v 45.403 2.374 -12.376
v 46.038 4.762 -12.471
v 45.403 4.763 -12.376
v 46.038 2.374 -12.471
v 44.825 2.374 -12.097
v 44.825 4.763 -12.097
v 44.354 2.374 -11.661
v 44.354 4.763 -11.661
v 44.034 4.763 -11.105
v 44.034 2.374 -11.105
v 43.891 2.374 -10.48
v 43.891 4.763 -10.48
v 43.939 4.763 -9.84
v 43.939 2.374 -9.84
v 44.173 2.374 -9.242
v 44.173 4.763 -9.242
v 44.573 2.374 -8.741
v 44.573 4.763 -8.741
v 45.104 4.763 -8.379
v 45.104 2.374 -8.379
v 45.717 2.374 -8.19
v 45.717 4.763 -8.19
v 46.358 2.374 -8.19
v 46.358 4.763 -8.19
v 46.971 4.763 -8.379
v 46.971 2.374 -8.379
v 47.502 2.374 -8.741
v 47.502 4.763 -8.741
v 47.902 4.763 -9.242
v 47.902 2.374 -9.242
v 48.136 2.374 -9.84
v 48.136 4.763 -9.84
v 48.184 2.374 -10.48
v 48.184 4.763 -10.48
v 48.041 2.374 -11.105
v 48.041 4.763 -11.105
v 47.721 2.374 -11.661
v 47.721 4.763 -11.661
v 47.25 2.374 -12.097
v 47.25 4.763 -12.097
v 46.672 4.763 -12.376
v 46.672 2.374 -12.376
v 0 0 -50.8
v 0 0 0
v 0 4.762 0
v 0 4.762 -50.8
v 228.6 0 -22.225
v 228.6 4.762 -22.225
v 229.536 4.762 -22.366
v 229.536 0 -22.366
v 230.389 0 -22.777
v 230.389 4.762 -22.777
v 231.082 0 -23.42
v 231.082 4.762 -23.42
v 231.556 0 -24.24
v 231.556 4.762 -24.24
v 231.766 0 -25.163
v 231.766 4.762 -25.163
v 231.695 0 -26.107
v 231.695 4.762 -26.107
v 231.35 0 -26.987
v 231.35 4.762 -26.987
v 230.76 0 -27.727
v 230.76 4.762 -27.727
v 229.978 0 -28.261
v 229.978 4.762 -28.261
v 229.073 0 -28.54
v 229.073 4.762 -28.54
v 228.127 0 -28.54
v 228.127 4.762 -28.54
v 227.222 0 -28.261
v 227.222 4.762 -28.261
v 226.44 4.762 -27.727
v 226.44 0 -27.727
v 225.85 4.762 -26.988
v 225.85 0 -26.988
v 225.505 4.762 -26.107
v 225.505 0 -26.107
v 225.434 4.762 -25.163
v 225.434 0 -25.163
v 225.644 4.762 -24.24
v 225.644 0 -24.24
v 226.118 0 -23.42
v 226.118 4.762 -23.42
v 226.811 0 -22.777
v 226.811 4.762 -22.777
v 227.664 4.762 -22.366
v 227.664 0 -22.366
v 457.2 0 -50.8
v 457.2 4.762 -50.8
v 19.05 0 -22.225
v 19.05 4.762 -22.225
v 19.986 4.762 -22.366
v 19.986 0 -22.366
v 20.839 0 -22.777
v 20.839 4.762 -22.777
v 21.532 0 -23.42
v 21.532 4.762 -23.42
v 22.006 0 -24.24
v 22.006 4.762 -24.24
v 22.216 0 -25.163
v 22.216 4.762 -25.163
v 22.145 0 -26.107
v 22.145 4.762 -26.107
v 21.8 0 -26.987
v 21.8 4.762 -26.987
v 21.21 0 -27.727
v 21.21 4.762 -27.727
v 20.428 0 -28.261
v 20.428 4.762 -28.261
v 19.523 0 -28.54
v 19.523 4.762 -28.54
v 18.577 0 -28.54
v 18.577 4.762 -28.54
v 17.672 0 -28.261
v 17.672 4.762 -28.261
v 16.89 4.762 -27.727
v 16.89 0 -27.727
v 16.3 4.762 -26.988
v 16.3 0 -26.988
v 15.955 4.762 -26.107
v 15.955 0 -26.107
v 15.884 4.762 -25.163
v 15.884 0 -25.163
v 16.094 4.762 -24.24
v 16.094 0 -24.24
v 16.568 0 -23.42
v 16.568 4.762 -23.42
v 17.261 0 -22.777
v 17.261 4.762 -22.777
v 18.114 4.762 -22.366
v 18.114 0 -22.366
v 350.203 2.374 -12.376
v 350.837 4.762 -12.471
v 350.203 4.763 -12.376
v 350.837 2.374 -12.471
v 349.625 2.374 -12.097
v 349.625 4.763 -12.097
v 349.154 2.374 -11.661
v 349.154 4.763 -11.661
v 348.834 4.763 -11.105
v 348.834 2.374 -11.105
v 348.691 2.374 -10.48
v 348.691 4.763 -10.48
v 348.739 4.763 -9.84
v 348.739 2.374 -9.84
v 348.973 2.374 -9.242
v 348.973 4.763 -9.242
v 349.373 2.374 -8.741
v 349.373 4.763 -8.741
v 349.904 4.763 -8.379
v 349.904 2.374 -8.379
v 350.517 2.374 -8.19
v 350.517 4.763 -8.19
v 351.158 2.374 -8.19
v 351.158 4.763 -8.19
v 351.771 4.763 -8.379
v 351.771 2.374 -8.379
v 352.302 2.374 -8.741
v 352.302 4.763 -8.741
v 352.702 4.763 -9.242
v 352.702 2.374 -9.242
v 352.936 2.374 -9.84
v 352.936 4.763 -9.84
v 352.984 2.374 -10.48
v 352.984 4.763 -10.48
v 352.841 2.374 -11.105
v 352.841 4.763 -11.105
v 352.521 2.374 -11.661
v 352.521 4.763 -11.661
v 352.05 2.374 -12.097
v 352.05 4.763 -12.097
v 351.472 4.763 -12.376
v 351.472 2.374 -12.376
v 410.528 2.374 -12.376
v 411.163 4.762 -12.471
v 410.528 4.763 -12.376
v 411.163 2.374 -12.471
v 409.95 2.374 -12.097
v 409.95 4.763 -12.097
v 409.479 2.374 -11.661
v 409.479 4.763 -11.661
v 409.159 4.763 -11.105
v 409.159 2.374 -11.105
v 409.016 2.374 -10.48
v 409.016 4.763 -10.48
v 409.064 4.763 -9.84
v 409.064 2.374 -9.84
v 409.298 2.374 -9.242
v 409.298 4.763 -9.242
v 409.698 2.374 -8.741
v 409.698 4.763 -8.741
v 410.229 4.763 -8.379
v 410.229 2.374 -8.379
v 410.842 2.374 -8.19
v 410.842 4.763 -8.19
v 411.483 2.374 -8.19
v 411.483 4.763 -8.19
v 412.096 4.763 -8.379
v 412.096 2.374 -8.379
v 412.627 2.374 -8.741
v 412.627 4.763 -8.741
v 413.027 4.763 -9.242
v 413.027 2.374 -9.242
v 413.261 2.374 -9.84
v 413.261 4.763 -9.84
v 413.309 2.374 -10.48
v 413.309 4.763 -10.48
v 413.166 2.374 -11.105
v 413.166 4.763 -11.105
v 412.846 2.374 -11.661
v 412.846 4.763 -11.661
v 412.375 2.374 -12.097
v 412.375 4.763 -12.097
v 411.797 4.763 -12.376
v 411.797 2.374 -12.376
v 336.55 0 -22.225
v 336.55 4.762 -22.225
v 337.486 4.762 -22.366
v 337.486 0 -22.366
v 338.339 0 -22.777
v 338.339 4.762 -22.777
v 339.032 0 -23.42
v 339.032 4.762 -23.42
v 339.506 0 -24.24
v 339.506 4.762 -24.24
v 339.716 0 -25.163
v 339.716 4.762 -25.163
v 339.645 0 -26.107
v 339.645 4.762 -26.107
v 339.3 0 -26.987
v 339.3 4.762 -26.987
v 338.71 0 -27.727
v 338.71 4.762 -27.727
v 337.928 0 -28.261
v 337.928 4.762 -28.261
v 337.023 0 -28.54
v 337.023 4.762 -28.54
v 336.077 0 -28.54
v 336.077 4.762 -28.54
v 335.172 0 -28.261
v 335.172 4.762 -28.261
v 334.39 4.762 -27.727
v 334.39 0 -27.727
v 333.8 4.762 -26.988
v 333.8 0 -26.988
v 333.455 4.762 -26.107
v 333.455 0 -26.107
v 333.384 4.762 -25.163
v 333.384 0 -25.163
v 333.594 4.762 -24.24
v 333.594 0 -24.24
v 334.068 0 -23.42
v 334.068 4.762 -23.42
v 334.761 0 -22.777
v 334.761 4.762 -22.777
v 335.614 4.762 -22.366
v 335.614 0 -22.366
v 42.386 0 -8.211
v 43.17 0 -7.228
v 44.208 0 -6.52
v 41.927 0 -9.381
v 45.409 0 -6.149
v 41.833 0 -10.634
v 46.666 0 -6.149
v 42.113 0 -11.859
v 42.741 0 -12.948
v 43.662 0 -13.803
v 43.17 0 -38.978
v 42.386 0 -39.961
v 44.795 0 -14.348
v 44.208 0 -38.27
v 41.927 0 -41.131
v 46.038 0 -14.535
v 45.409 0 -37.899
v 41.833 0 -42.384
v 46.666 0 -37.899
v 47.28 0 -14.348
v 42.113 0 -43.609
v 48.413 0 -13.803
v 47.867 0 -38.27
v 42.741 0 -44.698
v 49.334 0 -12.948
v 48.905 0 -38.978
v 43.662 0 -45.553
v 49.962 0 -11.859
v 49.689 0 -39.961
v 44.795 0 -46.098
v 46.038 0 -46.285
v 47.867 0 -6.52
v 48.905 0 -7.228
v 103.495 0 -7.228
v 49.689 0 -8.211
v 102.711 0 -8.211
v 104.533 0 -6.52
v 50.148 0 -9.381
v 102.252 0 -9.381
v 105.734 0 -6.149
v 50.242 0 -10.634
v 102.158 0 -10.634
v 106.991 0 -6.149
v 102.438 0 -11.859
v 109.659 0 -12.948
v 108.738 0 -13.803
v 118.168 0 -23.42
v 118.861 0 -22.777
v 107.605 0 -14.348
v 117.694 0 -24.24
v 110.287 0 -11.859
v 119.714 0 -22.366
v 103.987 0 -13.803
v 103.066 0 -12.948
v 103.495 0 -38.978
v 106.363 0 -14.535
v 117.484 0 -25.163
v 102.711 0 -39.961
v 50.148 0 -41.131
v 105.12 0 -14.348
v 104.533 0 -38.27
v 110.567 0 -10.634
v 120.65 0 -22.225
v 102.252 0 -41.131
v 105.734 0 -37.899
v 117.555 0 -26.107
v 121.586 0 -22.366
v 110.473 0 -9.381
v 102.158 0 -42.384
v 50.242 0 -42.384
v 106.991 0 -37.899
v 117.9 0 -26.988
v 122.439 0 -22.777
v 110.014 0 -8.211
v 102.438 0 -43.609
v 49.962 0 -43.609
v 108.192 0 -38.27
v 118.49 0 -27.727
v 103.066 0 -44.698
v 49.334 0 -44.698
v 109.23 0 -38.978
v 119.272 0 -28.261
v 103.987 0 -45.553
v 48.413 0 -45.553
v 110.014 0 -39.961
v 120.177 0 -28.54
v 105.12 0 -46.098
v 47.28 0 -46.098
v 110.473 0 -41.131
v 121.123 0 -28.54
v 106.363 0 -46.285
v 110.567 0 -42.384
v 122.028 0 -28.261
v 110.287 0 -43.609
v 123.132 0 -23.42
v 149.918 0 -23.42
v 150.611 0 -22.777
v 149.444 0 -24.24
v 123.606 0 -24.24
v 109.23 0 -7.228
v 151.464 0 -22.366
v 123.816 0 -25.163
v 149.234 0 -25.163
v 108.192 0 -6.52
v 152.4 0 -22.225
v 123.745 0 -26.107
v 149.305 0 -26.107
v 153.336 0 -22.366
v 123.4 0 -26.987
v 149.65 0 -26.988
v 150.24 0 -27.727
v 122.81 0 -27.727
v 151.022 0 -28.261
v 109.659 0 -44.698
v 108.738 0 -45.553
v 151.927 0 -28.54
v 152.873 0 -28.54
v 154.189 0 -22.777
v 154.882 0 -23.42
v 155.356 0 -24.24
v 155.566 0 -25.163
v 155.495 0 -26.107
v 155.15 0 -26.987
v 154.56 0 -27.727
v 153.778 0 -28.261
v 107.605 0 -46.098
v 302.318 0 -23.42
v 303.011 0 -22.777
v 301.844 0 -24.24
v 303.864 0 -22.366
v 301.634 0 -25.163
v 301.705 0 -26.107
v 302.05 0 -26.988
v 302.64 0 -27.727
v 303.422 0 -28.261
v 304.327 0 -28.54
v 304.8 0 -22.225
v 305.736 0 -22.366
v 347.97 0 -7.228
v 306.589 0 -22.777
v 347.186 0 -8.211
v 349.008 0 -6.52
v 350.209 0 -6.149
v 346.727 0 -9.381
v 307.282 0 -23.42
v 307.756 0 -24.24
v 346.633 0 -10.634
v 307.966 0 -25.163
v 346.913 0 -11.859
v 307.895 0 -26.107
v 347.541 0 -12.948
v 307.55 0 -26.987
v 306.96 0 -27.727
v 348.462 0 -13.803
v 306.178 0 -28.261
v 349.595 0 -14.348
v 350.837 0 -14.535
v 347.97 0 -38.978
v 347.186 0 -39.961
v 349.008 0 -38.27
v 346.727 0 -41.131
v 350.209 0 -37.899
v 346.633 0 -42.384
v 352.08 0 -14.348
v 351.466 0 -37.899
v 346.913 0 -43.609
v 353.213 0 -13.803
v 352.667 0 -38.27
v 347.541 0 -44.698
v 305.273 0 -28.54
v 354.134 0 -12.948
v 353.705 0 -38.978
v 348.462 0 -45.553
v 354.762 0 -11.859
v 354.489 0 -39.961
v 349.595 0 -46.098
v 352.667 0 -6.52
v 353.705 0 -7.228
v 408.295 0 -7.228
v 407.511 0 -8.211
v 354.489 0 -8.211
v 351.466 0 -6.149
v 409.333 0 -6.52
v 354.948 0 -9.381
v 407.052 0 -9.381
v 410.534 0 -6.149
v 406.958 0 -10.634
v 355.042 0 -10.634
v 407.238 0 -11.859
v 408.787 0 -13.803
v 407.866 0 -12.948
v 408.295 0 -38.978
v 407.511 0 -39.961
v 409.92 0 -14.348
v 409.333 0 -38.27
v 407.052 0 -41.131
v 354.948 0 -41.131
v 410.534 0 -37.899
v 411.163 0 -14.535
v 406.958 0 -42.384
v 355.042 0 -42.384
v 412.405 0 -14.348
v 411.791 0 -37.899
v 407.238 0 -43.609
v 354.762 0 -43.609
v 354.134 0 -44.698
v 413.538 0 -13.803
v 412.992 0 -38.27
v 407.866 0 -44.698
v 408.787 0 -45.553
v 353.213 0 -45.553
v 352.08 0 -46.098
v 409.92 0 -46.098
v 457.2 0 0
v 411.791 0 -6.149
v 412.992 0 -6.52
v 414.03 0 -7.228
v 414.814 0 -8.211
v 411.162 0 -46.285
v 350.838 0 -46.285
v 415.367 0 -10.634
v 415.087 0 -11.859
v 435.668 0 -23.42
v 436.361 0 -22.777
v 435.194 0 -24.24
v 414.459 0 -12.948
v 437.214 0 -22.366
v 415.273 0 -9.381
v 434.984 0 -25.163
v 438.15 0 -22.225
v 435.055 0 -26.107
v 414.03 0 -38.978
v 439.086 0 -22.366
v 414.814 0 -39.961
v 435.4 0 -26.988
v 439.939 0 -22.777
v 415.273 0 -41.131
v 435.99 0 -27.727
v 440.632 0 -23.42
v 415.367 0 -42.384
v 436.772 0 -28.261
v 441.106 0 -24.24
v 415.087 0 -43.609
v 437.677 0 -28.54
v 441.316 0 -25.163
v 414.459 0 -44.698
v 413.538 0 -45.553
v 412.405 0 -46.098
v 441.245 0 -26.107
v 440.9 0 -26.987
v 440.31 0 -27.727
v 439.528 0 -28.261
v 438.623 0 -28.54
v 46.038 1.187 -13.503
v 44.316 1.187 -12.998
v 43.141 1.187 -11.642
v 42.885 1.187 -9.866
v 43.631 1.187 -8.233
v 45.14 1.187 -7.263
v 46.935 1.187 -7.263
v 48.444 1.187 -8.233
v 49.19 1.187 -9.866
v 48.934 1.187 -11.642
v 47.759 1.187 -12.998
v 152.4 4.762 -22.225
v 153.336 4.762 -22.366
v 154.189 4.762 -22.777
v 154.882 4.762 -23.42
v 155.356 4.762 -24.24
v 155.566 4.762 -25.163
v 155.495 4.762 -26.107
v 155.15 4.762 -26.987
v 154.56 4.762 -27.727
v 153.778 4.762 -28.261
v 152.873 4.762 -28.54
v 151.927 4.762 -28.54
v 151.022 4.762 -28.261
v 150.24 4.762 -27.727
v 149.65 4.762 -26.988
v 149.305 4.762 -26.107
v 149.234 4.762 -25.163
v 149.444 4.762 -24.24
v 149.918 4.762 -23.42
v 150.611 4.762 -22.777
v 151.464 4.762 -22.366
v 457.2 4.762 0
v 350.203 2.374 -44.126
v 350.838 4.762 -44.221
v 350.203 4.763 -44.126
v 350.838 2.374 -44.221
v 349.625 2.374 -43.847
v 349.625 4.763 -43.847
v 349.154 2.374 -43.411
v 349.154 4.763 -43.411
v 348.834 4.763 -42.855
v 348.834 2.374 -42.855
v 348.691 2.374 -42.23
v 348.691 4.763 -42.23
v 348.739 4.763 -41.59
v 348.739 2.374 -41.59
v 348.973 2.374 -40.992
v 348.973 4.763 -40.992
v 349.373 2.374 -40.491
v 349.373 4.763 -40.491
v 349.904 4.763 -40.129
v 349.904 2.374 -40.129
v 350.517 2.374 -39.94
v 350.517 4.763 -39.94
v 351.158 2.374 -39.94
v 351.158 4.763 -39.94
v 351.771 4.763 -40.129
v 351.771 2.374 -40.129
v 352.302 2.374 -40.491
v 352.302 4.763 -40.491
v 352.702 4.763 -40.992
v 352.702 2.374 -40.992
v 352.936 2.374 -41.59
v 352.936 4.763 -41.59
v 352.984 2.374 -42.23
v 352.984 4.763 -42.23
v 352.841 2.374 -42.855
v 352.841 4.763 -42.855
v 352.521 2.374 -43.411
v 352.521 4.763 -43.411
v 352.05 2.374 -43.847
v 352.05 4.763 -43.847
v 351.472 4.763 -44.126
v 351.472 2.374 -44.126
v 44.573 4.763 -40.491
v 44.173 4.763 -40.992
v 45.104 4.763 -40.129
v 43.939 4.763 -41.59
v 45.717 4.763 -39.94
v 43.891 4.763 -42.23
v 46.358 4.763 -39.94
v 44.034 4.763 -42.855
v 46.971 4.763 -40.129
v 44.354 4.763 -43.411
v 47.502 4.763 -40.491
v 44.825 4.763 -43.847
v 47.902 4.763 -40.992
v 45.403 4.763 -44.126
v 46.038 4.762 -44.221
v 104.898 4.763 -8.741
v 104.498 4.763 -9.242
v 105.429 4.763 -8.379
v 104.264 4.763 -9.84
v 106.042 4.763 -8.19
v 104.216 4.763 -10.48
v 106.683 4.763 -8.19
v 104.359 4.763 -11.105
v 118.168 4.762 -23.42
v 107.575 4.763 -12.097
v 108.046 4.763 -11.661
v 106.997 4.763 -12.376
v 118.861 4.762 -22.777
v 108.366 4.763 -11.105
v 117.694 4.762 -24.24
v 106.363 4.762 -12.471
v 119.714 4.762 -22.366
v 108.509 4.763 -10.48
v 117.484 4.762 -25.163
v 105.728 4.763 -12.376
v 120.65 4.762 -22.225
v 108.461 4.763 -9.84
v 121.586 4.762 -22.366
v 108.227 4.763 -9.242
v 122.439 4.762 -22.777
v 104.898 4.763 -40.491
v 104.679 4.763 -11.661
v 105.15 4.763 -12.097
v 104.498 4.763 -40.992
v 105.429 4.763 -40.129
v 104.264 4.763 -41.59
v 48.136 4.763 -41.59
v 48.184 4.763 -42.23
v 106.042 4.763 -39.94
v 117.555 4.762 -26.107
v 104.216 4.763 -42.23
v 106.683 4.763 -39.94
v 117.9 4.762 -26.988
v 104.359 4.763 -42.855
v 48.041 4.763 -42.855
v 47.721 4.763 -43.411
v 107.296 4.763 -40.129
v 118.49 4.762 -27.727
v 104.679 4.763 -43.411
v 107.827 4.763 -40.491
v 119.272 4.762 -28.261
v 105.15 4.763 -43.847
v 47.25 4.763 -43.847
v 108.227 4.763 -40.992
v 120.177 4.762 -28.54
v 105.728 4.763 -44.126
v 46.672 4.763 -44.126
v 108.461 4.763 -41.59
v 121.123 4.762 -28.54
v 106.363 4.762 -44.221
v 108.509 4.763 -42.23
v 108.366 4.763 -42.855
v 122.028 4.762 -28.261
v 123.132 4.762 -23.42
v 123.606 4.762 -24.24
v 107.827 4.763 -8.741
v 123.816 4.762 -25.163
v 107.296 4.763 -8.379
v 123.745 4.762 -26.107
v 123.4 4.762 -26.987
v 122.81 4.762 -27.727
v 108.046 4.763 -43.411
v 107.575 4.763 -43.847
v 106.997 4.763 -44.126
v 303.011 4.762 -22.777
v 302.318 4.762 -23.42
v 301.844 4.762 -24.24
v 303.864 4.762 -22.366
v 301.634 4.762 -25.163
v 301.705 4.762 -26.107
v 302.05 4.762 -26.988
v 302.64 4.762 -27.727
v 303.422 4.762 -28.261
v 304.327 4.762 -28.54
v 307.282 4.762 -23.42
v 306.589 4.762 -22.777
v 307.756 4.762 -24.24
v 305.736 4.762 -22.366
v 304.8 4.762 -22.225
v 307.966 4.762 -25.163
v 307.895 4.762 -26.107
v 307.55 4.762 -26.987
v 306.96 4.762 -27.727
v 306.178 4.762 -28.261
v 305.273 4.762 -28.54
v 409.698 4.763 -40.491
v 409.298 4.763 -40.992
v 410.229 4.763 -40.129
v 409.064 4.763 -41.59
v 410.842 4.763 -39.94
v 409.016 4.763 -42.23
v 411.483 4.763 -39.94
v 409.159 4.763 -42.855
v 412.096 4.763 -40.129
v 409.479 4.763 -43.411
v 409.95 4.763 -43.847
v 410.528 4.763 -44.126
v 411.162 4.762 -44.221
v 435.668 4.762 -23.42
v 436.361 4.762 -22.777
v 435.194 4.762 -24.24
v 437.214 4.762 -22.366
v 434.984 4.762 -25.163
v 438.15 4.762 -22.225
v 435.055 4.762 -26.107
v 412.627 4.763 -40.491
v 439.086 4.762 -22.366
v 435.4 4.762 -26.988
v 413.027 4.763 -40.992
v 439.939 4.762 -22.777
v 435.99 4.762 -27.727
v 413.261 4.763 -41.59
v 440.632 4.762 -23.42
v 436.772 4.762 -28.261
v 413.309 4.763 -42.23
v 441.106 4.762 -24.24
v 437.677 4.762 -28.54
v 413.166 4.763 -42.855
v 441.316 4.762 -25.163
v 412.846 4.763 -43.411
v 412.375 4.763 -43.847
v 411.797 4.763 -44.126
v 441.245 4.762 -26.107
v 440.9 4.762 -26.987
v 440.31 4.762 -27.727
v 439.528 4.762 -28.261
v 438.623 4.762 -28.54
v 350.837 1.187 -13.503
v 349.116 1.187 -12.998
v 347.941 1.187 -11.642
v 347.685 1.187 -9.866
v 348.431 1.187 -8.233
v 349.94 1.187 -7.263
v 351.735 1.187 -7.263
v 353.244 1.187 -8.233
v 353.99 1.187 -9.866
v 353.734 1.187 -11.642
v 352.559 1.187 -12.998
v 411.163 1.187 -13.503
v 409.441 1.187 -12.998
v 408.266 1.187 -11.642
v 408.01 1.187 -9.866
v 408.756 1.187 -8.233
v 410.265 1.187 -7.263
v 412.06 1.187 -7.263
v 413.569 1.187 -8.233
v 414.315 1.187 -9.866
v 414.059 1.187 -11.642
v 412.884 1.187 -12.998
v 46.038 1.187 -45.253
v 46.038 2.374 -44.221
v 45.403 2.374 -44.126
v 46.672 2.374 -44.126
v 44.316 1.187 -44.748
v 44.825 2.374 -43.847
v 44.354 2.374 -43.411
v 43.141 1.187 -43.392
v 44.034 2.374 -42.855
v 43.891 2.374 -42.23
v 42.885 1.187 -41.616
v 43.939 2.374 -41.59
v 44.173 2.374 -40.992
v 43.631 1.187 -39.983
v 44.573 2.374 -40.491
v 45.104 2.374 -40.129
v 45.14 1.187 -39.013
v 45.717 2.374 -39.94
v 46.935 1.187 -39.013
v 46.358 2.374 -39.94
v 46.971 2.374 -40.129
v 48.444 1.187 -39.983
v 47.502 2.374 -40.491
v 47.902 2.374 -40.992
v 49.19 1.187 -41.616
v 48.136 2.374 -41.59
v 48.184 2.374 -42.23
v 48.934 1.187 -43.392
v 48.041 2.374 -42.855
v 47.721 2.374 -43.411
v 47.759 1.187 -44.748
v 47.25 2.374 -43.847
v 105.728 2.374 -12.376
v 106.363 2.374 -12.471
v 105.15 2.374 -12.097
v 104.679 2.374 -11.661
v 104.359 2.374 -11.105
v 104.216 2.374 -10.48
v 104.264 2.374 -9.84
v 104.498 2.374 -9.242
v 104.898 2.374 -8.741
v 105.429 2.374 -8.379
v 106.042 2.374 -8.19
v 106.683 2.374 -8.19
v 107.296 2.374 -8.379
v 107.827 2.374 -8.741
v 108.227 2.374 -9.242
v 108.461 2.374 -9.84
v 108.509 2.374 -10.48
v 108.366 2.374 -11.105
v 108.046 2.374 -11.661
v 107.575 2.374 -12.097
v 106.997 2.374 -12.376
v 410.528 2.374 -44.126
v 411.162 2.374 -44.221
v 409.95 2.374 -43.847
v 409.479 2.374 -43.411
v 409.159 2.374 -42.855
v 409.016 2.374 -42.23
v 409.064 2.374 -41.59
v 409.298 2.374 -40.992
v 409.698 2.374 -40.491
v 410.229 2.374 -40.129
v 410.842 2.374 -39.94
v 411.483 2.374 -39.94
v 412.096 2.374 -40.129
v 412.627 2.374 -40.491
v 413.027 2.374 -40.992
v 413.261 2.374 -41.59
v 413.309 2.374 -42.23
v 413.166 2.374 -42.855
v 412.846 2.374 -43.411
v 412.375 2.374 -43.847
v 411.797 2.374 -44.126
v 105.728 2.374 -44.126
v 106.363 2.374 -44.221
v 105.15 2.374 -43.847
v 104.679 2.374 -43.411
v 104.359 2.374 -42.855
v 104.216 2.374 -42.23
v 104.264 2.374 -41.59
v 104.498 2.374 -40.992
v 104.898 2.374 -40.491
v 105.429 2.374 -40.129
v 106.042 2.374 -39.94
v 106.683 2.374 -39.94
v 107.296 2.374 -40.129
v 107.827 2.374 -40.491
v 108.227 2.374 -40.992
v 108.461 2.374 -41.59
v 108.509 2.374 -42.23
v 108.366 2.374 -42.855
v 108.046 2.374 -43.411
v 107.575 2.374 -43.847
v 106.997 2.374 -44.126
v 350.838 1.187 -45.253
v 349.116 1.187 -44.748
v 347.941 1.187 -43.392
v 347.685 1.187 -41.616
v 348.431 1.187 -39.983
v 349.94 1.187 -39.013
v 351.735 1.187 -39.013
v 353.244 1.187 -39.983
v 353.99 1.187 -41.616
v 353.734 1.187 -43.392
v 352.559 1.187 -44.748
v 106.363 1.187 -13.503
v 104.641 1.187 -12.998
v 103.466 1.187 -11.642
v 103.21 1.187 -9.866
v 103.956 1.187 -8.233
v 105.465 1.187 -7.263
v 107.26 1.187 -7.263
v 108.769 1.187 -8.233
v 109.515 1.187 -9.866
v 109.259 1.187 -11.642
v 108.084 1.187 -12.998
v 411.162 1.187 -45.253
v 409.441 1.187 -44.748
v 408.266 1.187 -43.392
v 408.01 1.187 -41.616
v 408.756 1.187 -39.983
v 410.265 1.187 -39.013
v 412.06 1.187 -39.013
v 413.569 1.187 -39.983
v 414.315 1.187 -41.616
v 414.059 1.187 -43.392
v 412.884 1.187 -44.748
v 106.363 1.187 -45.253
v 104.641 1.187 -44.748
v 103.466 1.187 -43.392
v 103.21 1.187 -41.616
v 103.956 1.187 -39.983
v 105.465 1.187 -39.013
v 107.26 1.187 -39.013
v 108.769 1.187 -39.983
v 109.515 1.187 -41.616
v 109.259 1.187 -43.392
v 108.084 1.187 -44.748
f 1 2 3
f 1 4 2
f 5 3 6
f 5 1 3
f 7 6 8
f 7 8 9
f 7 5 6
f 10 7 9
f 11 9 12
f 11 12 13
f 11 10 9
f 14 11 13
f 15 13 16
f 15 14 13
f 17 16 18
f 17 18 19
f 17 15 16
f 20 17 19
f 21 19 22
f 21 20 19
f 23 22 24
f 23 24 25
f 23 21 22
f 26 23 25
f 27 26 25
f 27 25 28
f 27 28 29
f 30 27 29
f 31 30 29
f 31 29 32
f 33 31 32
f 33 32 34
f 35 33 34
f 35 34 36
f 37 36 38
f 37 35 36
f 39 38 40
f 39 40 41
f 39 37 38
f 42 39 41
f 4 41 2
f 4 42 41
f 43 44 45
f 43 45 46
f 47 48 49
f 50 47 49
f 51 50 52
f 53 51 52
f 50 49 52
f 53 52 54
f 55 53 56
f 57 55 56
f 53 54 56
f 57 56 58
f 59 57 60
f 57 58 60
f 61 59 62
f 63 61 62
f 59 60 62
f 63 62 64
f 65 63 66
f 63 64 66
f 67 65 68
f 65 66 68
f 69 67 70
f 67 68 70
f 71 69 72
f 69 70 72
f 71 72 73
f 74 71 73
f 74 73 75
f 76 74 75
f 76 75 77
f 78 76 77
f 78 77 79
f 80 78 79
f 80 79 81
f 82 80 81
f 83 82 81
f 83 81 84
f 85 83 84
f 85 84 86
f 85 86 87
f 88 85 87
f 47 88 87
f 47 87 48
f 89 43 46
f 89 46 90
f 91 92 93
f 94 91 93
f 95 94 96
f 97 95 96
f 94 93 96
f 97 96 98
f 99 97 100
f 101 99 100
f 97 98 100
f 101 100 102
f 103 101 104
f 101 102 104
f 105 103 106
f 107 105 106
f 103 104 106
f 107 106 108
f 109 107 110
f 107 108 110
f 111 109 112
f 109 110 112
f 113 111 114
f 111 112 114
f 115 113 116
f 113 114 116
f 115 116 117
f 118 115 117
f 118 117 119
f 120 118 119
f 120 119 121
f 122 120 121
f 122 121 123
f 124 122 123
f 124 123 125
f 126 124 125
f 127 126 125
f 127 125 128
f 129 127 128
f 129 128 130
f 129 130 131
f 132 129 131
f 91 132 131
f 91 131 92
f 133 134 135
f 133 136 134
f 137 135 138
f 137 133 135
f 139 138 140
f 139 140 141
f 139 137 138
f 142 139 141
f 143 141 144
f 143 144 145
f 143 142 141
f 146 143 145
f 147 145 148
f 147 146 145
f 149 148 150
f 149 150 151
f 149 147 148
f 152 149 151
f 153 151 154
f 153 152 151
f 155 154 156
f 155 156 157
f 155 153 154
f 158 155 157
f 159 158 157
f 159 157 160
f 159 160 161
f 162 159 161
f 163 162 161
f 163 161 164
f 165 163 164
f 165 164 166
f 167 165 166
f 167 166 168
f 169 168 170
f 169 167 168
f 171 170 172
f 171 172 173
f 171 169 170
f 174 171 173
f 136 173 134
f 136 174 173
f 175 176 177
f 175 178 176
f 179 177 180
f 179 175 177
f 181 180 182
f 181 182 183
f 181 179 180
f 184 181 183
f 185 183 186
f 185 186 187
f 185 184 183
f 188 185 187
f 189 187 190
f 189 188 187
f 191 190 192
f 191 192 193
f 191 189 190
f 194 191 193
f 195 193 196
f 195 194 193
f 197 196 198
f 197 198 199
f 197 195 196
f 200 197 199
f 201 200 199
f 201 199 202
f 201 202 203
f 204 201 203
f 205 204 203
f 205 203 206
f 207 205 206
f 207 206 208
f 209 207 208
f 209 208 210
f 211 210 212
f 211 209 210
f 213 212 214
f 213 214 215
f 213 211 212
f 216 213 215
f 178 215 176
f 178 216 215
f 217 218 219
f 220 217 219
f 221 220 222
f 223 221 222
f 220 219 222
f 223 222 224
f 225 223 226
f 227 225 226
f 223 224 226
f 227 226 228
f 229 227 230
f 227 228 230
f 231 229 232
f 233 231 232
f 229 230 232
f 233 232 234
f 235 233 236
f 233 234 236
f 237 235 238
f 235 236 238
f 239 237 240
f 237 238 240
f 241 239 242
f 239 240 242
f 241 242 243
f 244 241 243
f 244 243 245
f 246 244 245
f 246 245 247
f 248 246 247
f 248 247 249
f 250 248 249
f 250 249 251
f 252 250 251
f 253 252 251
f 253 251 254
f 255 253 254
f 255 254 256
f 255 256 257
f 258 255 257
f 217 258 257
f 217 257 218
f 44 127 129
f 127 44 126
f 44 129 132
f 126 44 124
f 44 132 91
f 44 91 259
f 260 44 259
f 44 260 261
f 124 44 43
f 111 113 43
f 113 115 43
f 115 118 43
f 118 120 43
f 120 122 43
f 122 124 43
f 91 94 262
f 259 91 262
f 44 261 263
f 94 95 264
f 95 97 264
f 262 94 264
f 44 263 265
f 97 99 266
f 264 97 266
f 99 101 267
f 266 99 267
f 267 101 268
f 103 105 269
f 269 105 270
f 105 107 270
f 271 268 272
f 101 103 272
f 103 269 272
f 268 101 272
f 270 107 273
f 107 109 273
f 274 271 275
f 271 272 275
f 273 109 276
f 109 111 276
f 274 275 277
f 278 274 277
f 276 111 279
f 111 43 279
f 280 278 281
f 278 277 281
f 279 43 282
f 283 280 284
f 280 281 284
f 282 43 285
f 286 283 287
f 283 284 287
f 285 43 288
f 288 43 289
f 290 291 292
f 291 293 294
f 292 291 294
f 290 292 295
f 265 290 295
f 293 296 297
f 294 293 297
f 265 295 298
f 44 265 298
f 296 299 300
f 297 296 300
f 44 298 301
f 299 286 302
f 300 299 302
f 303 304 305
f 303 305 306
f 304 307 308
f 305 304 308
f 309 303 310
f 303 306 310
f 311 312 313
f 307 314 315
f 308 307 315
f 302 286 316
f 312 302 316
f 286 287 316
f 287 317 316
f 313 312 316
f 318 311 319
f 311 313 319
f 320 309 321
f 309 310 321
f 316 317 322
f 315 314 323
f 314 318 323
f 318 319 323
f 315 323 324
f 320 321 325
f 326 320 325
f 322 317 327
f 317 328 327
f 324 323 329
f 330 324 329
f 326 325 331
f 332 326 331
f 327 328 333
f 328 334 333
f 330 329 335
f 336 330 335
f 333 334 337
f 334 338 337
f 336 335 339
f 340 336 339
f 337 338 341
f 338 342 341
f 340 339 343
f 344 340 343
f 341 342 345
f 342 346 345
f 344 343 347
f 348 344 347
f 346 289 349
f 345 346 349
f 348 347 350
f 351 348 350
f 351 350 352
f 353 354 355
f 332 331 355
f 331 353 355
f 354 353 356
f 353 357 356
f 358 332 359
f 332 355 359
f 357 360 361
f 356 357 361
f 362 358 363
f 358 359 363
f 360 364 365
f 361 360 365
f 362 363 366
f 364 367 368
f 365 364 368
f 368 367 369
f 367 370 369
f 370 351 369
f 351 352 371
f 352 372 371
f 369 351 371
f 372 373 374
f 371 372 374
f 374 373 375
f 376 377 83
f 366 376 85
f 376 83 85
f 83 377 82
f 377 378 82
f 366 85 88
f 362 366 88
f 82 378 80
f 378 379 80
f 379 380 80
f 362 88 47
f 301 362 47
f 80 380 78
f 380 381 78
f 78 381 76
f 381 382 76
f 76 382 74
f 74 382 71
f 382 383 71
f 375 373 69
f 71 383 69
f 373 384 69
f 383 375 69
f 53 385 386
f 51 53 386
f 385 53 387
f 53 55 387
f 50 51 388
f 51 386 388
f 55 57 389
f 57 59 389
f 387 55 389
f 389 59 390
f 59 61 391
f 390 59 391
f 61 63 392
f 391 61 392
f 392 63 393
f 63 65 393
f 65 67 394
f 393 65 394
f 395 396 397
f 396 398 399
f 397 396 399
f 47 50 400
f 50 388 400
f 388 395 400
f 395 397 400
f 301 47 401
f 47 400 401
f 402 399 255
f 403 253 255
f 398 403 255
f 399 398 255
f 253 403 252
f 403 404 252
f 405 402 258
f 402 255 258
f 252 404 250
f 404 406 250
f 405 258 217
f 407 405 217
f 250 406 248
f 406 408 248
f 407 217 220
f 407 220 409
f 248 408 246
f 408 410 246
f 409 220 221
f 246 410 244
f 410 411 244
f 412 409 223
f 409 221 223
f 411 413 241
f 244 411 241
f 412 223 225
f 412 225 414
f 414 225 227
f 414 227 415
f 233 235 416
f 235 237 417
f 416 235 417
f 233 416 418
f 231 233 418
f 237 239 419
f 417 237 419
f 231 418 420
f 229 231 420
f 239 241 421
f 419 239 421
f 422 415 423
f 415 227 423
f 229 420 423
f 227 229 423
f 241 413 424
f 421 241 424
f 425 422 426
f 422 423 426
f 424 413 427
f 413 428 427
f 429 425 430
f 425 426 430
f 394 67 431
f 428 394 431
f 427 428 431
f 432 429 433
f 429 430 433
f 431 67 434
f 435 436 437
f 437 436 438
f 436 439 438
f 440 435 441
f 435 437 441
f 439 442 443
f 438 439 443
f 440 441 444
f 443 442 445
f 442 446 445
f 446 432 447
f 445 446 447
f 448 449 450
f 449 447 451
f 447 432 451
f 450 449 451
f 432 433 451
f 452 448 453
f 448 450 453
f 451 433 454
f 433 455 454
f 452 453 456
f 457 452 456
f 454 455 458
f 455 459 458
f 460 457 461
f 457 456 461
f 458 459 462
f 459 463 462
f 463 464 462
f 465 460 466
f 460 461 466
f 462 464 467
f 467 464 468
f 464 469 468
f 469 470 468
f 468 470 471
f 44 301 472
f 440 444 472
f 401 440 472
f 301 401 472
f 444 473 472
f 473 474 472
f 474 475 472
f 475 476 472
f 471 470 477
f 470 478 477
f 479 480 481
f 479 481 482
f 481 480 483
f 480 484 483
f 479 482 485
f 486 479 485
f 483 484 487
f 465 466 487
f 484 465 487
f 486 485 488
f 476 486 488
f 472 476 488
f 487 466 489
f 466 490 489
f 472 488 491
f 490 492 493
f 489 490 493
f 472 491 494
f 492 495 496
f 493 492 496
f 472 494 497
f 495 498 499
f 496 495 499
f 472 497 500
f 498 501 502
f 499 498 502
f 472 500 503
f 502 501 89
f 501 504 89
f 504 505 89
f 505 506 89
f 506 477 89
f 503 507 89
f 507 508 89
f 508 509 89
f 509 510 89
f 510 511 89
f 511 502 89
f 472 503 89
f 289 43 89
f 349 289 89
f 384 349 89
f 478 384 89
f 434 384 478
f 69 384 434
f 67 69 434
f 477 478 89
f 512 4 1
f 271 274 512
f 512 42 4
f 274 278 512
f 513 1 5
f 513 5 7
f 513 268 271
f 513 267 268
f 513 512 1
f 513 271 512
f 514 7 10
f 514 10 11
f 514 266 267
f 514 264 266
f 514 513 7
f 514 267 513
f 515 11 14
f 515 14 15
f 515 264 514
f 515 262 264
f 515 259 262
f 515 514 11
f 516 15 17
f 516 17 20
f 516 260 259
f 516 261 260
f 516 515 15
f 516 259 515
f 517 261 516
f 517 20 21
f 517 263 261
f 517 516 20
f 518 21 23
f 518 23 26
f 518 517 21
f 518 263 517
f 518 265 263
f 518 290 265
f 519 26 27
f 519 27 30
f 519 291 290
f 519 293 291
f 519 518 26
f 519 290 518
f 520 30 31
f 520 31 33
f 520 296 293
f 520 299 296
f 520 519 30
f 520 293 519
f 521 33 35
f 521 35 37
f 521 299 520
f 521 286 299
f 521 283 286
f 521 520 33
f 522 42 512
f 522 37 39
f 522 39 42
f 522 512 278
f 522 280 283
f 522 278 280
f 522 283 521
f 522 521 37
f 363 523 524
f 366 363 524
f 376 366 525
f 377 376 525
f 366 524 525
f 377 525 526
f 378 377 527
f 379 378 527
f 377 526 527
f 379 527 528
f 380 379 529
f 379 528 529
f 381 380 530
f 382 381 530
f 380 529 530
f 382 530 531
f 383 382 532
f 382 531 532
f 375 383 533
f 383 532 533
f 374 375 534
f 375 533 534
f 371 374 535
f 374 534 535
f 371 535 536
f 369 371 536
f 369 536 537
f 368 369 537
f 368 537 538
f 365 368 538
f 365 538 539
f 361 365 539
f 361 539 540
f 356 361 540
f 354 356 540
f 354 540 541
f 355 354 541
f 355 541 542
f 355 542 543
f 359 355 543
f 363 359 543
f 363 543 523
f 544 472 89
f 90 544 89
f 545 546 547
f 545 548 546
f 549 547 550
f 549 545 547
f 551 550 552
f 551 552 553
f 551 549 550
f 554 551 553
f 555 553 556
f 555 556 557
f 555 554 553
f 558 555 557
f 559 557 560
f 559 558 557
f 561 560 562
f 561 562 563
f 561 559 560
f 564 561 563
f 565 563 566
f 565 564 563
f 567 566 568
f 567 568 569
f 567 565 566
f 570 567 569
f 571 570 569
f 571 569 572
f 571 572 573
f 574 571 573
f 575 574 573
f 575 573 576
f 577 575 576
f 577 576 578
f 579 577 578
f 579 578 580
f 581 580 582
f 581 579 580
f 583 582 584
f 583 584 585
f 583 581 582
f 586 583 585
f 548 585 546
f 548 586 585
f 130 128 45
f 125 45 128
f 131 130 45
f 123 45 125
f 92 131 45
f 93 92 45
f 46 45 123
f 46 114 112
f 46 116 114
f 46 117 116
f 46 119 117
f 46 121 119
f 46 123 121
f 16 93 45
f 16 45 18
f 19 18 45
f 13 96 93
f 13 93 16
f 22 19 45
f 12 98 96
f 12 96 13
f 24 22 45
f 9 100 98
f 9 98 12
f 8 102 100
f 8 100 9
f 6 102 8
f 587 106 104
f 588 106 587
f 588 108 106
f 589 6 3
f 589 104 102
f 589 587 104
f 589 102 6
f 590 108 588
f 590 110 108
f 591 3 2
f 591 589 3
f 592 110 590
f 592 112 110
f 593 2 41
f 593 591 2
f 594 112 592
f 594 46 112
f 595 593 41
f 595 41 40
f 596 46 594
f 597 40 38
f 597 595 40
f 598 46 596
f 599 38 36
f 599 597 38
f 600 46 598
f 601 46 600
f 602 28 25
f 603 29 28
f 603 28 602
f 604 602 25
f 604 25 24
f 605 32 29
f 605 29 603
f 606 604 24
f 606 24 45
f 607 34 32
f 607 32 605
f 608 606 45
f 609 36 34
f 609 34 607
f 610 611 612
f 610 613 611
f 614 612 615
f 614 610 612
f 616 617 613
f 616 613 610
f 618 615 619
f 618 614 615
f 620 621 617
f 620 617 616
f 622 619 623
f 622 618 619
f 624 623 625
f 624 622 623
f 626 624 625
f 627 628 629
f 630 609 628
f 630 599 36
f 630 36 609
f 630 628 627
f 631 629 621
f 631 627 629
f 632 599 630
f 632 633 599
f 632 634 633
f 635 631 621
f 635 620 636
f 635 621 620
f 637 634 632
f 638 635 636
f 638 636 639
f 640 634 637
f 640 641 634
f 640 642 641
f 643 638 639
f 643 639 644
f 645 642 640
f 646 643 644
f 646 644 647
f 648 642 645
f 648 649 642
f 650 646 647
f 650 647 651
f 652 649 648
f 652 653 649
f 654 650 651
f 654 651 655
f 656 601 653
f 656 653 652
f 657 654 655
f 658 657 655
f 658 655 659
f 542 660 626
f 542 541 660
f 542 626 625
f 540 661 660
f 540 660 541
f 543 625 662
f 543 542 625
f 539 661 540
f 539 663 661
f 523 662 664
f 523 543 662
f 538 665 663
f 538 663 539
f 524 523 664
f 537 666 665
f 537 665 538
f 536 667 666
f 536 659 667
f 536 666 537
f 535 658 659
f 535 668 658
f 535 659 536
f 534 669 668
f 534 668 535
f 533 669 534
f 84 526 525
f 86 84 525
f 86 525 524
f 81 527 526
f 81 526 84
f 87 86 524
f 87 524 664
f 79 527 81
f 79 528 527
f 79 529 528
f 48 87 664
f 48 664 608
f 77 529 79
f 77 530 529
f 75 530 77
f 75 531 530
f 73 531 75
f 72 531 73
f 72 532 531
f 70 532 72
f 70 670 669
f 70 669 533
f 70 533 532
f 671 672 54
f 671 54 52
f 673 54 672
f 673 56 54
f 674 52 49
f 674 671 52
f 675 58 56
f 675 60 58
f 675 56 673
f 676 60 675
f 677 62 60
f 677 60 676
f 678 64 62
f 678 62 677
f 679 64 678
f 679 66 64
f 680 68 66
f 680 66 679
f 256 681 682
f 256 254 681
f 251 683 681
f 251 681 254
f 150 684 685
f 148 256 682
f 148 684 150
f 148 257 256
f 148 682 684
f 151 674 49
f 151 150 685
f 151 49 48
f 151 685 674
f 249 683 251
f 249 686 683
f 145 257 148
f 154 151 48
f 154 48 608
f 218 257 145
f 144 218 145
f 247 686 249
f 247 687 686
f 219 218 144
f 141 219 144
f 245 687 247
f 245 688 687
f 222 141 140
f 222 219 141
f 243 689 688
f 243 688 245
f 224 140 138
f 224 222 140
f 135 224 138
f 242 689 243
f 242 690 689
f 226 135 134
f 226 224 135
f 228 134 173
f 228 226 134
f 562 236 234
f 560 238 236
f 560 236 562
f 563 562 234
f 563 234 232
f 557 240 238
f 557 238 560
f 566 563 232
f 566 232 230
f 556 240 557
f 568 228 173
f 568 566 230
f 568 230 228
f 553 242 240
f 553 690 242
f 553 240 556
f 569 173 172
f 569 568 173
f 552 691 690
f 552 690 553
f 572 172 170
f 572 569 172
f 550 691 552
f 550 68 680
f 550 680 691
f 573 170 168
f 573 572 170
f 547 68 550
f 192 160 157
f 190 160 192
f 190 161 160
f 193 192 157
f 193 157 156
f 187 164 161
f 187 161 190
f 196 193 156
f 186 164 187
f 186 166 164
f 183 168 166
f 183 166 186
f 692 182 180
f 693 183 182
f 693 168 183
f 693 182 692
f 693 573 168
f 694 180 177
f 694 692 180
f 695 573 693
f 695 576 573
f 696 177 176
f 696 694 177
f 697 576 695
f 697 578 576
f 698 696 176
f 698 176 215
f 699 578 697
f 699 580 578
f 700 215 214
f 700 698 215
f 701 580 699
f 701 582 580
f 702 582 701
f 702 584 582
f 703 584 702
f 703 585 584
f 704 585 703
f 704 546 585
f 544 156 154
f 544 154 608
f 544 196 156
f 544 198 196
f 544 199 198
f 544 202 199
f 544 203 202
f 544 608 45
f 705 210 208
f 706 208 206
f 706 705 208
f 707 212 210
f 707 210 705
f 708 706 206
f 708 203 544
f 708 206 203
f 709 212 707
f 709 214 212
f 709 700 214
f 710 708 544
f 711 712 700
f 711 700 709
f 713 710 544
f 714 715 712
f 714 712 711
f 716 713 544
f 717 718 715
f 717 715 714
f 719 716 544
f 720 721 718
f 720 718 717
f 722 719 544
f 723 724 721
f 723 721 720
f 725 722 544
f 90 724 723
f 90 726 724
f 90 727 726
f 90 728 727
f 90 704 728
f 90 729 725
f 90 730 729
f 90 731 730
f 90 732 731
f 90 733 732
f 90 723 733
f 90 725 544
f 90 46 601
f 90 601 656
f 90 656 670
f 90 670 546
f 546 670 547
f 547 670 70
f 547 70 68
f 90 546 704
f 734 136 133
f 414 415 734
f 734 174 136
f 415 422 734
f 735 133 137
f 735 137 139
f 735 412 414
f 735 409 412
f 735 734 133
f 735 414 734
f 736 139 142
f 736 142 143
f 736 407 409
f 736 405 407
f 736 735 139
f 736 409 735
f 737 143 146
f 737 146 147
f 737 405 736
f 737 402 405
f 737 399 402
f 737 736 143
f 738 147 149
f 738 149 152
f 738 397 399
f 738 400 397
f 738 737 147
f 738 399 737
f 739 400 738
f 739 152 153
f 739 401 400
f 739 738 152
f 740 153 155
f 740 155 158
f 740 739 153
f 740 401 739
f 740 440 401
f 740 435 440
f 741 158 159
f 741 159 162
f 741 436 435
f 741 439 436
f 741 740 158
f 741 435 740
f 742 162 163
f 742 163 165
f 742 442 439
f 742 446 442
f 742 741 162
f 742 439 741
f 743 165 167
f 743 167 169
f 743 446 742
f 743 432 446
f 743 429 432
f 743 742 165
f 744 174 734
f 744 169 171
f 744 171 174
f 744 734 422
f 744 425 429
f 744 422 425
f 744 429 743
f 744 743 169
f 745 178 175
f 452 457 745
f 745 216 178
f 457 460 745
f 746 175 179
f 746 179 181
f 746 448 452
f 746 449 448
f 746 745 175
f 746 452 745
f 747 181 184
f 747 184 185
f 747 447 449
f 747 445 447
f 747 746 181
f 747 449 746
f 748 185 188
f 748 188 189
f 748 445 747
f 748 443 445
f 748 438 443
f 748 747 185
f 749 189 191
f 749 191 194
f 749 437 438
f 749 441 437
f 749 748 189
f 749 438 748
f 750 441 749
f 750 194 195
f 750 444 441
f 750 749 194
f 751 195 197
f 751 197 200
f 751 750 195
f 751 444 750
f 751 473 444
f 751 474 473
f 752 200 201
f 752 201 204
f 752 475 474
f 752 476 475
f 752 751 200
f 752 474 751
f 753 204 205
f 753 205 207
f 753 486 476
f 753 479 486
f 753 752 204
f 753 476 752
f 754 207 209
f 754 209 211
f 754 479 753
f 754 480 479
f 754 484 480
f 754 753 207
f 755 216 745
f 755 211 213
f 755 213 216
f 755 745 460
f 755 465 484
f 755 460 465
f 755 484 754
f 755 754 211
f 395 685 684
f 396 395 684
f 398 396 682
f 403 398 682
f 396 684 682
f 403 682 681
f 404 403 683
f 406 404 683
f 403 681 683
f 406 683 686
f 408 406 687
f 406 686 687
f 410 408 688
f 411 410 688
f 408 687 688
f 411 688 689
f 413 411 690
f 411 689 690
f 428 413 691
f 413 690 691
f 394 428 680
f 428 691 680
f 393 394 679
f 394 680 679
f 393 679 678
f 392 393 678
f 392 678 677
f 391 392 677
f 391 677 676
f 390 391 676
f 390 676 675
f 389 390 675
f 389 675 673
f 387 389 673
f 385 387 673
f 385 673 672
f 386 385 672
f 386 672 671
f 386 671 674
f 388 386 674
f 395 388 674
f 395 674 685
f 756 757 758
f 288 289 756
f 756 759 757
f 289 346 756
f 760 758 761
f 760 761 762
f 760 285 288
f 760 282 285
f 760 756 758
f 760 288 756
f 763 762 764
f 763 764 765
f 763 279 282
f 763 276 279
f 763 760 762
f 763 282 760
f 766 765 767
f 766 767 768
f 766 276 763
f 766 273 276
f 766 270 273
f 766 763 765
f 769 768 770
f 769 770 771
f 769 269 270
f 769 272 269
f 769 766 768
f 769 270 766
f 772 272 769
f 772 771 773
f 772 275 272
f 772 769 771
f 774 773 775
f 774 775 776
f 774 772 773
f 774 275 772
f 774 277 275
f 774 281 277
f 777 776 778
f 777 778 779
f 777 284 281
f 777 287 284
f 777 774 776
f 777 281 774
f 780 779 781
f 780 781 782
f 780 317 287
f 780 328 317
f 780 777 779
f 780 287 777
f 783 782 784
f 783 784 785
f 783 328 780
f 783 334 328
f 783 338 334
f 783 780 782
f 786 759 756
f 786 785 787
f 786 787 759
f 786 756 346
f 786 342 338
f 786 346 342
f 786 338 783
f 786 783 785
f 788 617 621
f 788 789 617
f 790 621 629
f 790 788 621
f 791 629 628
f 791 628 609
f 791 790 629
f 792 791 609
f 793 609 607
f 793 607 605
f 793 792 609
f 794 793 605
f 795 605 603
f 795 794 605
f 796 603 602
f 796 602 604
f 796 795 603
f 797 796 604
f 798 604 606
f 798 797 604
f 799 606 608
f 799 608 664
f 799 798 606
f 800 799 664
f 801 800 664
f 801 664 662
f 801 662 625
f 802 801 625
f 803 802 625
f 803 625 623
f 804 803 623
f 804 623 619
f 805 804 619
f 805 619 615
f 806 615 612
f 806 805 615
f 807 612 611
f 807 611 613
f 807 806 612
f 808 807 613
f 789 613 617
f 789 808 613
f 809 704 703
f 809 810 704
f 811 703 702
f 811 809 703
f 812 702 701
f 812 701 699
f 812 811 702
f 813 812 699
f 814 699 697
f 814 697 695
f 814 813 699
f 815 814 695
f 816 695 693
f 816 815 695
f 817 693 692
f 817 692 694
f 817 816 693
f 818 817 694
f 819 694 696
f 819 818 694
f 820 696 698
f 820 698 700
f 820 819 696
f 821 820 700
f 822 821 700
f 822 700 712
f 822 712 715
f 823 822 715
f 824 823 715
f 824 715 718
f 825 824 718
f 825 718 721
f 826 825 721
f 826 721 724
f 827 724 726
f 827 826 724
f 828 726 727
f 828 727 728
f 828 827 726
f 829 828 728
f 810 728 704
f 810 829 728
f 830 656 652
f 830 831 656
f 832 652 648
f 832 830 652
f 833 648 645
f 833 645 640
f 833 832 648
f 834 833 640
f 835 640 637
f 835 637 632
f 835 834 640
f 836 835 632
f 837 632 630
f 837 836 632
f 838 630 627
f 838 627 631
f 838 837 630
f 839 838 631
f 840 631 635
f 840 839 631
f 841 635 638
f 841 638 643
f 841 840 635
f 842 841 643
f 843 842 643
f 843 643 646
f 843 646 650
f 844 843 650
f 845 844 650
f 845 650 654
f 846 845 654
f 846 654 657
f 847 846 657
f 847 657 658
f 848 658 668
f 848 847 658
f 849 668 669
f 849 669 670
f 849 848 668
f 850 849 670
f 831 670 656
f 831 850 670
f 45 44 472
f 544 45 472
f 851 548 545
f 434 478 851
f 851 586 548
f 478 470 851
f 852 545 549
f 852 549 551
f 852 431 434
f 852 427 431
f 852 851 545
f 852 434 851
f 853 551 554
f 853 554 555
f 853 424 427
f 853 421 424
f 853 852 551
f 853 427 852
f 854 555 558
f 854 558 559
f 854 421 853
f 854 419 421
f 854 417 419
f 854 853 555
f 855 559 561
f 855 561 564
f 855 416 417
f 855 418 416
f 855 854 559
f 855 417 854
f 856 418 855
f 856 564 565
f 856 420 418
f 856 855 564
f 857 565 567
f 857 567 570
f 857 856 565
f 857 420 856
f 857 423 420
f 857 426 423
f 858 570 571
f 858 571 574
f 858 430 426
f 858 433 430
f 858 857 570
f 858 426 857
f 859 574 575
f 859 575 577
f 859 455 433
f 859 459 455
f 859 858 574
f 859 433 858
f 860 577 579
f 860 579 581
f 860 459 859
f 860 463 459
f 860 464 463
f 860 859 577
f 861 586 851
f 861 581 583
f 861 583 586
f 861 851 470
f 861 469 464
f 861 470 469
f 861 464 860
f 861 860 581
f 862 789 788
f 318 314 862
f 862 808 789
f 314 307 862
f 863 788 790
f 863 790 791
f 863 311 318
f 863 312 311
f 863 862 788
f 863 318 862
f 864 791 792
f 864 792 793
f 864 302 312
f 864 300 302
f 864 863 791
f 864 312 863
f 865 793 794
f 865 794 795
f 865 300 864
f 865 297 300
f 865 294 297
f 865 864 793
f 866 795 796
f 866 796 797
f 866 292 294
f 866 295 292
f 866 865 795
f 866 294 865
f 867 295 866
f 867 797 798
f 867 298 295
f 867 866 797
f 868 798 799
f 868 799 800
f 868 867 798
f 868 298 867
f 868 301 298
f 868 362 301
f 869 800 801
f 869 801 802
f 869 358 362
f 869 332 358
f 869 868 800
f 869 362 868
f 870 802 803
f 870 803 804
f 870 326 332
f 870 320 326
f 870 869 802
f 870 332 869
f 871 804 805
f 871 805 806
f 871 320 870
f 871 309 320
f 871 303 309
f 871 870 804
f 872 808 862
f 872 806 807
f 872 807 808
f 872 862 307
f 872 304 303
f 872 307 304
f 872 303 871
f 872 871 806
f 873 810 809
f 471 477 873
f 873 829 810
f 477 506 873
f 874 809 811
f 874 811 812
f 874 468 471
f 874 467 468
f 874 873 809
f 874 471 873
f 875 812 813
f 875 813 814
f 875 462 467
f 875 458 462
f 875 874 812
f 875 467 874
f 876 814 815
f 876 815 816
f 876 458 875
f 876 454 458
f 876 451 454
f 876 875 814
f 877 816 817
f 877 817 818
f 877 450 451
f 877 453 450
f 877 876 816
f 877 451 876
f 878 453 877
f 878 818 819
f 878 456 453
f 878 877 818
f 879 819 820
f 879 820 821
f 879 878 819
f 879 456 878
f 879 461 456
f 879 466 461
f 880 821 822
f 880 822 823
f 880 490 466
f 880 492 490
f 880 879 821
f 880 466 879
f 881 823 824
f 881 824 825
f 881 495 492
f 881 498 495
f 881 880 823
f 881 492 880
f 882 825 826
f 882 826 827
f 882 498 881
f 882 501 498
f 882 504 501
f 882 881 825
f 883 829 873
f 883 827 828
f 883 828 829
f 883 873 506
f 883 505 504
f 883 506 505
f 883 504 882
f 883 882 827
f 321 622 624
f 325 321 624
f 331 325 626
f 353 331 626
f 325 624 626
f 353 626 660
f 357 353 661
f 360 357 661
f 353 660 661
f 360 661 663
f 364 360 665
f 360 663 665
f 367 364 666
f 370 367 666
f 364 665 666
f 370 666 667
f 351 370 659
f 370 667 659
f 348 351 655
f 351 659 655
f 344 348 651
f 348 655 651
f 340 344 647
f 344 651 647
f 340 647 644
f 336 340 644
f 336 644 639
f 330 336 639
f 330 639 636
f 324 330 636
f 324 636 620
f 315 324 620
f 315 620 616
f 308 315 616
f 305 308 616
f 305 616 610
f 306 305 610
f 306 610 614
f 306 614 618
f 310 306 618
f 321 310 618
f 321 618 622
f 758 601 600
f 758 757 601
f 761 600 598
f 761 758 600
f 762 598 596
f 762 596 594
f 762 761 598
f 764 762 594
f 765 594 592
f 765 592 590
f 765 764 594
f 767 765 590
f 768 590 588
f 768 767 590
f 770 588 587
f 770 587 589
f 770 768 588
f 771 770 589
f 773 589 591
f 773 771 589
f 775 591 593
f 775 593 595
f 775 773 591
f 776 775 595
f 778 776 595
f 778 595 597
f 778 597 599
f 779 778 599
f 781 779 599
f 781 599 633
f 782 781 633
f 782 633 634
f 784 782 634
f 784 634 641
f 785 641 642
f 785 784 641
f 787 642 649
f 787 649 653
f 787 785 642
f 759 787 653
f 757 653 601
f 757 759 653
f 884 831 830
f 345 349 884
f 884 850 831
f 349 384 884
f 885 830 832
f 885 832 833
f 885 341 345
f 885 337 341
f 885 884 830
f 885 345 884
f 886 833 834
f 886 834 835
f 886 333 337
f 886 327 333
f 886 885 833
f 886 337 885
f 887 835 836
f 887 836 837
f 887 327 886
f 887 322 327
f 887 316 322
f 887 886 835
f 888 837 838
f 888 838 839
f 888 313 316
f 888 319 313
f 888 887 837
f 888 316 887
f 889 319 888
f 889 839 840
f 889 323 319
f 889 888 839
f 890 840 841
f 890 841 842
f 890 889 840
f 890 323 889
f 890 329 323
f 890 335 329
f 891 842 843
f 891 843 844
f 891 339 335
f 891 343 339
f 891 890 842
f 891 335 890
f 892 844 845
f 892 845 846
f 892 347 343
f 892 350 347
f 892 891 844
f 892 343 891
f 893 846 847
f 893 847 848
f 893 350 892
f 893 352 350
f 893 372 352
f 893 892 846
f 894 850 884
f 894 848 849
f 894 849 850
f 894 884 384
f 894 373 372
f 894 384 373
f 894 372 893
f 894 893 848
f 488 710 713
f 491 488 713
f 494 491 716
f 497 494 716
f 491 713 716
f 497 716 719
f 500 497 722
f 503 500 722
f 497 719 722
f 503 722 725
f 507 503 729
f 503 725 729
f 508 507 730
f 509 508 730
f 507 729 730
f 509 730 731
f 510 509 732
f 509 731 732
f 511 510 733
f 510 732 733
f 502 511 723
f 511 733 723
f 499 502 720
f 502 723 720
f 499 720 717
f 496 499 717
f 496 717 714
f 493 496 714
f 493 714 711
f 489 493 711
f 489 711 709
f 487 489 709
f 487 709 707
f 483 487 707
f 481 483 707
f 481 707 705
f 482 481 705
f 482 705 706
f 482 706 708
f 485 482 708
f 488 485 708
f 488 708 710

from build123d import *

# Parameters (mm, degrees)
SKETCH1_W                                     = 457.2
SKETCH1_H                                     = 50.8
BOSS_EXTRUDE1_DEPTH                           = 4.7625
SKETCH2_R                                     = 3.175
CUT_EXTRUDE1_DEPTH                            = 244.602
SKETCH3_R                                     = 3.175
CUT_EXTRUDE2_DEPTH                            = 244.602
SKETCH4_R                                     = 3.175
CUT_EXTRUDE3_DEPTH                            = 25.4
CSK_FOR_8_FLAT_HEAD_MACHINE_SCREW1_AT_2_COUNT = 2
CSK_FOR_8_FLAT_HEAD_MACHINE_SCREW1_AT_2_PITCH = 31.75
CSK_FOR_8_FLAT_HEAD_MACHINE_SCREW1_AT_3_COUNT = 2
CSK_FOR_8_FLAT_HEAD_MACHINE_SCREW1_AT_3_PITCH = 68.170141008
CSK_FOR_8_FLAT_HEAD_MACHINE_SCREW1_AT_4_COUNT = 2
CSK_FOR_8_FLAT_HEAD_MACHINE_SCREW1_AT_4_PITCH = 60.325
CSK_FOR_8_FLAT_HEAD_MACHINE_SCREW1_AT_5_COUNT = 2
CSK_FOR_8_FLAT_HEAD_MACHINE_SCREW1_AT_5_PITCH = 304.8
CSK_FOR_8_FLAT_HEAD_MACHINE_SCREW1_AT_6_COUNT = 2
CSK_FOR_8_FLAT_HEAD_MACHINE_SCREW1_AT_6_PITCH = 306.449184205
CSK_FOR_8_FLAT_HEAD_MACHINE_SCREW1_AT_7_COUNT = 2
CSK_FOR_8_FLAT_HEAD_MACHINE_SCREW1_AT_7_PITCH = 366.502835085
CSK_FOR_8_FLAT_HEAD_MACHINE_SCREW1_AT_8_COUNT = 2
CSK_FOR_8_FLAT_HEAD_MACHINE_SCREW1_AT_8_PITCH = 365.125


with BuildPart() as part:
    # Sketch1 → Boss-Extrude1 (new body)
    with BuildSketch(Plane(origin=(0, 0, 0), x_dir=(1, 0, 0), z_dir=(0, 1, 0))):
        with Locations((228.6, 25.4)):
            Rectangle(SKETCH1_W, SKETCH1_H)
    extrude(amount=BOSS_EXTRUDE1_DEPTH)

    # Sketch2 → Cut-Extrude1 (cut)
    with BuildSketch(Plane(origin=(0, 4.7625, 0), x_dir=(1, 0, 0), z_dir=(0, 1, 0))):
        with Locations(Location((19.05, 25.4, 0), (0, 0, 270))):
            Circle(SKETCH2_R)
        with Locations(Location((438.15, 25.4, 0), (0, 0, 270))):
            Circle(SKETCH2_R)
    extrude(amount=-CUT_EXTRUDE1_DEPTH, mode=Mode.SUBTRACT)

    # Sketch3 → Cut-Extrude2 (cut)
    with BuildSketch(Plane(origin=(0, 4.7625, 0), x_dir=(1, 0, 0), z_dir=(0, 1, 0))):
        with Locations(Location((152.4, 25.4, 0), (0, 0, 270))):
            Circle(SKETCH3_R)
        with Locations(Location((304.8, 25.4, 0), (0, 0, 270))):
            Circle(SKETCH3_R)
        with Locations(Location((228.6, 25.4, 0), (0, 0, 270))):
            Circle(SKETCH3_R)
    extrude(amount=-CUT_EXTRUDE2_DEPTH, mode=Mode.SUBTRACT)

    # Sketch4 → Cut-Extrude3 (cut)
    with BuildSketch(Plane(origin=(0, 4.7625, 0), x_dir=(1, 0, 0), z_dir=(0, 1, 0))):
        with Locations(Location((120.65, 25.4, 0), (0, 0, 270))):
            Circle(SKETCH4_R)
        with Locations(Location((336.55, 25.4, 0), (0, 0, 270))):
            Circle(SKETCH4_R)
    extrude(amount=-CUT_EXTRUDE3_DEPTH, mode=Mode.SUBTRACT)

    # Sketch5 → CSK for #8 Flat Head Machine Screw1 (revolve, cut)
    with BuildSketch(Plane(origin=(46.0375, 0, -42.06875), x_dir=(0, 0, -1), z_dir=(1, 0, 0))):
        Polygon((0, 0), (0, 4.7625), (2.15265, 4.7625), (2.15265, 2.3740728), (4.2164, 0), align=None)
    csk_for_8_flat_head_machine_screw1 = revolve(axis=Axis((46.0375, -6.35, -42.06875), (0, 1, 0)), mode=Mode.SUBTRACT)

    # CSK for #8 Flat Head Machine Screw1 at 2: CSK for #8 Flat Head Machine Screw1 ×2
    with Locations(*[(0, 0, i * CSK_FOR_8_FLAT_HEAD_MACHINE_SCREW1_AT_2_PITCH) for i in range(1, CSK_FOR_8_FLAT_HEAD_MACHINE_SCREW1_AT_2_COUNT)]):
        add(csk_for_8_flat_head_machine_screw1, mode=Mode.SUBTRACT)

    # CSK for #8 Flat Head Machine Screw1 at 3: CSK for #8 Flat Head Machine Screw1 ×2
    with Locations(*[Vector(0.8849182223819825, 0, 0.4657464328326221) * (i * CSK_FOR_8_FLAT_HEAD_MACHINE_SCREW1_AT_3_PITCH) for i in range(1, CSK_FOR_8_FLAT_HEAD_MACHINE_SCREW1_AT_3_COUNT)]):
        add(csk_for_8_flat_head_machine_screw1, mode=Mode.SUBTRACT)

    # CSK for #8 Flat Head Machine Screw1 at 4: CSK for #8 Flat Head Machine Screw1 ×2
    with Locations(*[(i * CSK_FOR_8_FLAT_HEAD_MACHINE_SCREW1_AT_4_PITCH, 0, 0) for i in range(1, CSK_FOR_8_FLAT_HEAD_MACHINE_SCREW1_AT_4_COUNT)]):
        add(csk_for_8_flat_head_machine_screw1, mode=Mode.SUBTRACT)

    # CSK for #8 Flat Head Machine Screw1 at 5: CSK for #8 Flat Head Machine Screw1 ×2
    with Locations(*[(i * CSK_FOR_8_FLAT_HEAD_MACHINE_SCREW1_AT_5_PITCH, 0, 0) for i in range(1, CSK_FOR_8_FLAT_HEAD_MACHINE_SCREW1_AT_5_COUNT)]):
        add(csk_for_8_flat_head_machine_screw1, mode=Mode.SUBTRACT)

    # CSK for #8 Flat Head Machine Screw1 at 6: CSK for #8 Flat Head Machine Screw1 ×2
    with Locations(*[Vector(0.9946184088907778, 0, 0.103606084259456) * (i * CSK_FOR_8_FLAT_HEAD_MACHINE_SCREW1_AT_6_PITCH) for i in range(1, CSK_FOR_8_FLAT_HEAD_MACHINE_SCREW1_AT_6_COUNT)]):
        add(csk_for_8_flat_head_machine_screw1, mode=Mode.SUBTRACT)

    # CSK for #8 Flat Head Machine Screw1 at 7: CSK for #8 Flat Head Machine Screw1 ×2
    with Locations(*[Vector(0.996240588195683, 0, 0.086629616364842) * (i * CSK_FOR_8_FLAT_HEAD_MACHINE_SCREW1_AT_7_PITCH) for i in range(1, CSK_FOR_8_FLAT_HEAD_MACHINE_SCREW1_AT_7_COUNT)]):
        add(csk_for_8_flat_head_machine_screw1, mode=Mode.SUBTRACT)

    # CSK for #8 Flat Head Machine Screw1 at 8: CSK for #8 Flat Head Machine Screw1 ×2
    with Locations(*[(i * CSK_FOR_8_FLAT_HEAD_MACHINE_SCREW1_AT_8_PITCH, 0, 0) for i in range(1, CSK_FOR_8_FLAT_HEAD_MACHINE_SCREW1_AT_8_COUNT)]):
        add(csk_for_8_flat_head_machine_screw1, mode=Mode.SUBTRACT)


solid = part.part
